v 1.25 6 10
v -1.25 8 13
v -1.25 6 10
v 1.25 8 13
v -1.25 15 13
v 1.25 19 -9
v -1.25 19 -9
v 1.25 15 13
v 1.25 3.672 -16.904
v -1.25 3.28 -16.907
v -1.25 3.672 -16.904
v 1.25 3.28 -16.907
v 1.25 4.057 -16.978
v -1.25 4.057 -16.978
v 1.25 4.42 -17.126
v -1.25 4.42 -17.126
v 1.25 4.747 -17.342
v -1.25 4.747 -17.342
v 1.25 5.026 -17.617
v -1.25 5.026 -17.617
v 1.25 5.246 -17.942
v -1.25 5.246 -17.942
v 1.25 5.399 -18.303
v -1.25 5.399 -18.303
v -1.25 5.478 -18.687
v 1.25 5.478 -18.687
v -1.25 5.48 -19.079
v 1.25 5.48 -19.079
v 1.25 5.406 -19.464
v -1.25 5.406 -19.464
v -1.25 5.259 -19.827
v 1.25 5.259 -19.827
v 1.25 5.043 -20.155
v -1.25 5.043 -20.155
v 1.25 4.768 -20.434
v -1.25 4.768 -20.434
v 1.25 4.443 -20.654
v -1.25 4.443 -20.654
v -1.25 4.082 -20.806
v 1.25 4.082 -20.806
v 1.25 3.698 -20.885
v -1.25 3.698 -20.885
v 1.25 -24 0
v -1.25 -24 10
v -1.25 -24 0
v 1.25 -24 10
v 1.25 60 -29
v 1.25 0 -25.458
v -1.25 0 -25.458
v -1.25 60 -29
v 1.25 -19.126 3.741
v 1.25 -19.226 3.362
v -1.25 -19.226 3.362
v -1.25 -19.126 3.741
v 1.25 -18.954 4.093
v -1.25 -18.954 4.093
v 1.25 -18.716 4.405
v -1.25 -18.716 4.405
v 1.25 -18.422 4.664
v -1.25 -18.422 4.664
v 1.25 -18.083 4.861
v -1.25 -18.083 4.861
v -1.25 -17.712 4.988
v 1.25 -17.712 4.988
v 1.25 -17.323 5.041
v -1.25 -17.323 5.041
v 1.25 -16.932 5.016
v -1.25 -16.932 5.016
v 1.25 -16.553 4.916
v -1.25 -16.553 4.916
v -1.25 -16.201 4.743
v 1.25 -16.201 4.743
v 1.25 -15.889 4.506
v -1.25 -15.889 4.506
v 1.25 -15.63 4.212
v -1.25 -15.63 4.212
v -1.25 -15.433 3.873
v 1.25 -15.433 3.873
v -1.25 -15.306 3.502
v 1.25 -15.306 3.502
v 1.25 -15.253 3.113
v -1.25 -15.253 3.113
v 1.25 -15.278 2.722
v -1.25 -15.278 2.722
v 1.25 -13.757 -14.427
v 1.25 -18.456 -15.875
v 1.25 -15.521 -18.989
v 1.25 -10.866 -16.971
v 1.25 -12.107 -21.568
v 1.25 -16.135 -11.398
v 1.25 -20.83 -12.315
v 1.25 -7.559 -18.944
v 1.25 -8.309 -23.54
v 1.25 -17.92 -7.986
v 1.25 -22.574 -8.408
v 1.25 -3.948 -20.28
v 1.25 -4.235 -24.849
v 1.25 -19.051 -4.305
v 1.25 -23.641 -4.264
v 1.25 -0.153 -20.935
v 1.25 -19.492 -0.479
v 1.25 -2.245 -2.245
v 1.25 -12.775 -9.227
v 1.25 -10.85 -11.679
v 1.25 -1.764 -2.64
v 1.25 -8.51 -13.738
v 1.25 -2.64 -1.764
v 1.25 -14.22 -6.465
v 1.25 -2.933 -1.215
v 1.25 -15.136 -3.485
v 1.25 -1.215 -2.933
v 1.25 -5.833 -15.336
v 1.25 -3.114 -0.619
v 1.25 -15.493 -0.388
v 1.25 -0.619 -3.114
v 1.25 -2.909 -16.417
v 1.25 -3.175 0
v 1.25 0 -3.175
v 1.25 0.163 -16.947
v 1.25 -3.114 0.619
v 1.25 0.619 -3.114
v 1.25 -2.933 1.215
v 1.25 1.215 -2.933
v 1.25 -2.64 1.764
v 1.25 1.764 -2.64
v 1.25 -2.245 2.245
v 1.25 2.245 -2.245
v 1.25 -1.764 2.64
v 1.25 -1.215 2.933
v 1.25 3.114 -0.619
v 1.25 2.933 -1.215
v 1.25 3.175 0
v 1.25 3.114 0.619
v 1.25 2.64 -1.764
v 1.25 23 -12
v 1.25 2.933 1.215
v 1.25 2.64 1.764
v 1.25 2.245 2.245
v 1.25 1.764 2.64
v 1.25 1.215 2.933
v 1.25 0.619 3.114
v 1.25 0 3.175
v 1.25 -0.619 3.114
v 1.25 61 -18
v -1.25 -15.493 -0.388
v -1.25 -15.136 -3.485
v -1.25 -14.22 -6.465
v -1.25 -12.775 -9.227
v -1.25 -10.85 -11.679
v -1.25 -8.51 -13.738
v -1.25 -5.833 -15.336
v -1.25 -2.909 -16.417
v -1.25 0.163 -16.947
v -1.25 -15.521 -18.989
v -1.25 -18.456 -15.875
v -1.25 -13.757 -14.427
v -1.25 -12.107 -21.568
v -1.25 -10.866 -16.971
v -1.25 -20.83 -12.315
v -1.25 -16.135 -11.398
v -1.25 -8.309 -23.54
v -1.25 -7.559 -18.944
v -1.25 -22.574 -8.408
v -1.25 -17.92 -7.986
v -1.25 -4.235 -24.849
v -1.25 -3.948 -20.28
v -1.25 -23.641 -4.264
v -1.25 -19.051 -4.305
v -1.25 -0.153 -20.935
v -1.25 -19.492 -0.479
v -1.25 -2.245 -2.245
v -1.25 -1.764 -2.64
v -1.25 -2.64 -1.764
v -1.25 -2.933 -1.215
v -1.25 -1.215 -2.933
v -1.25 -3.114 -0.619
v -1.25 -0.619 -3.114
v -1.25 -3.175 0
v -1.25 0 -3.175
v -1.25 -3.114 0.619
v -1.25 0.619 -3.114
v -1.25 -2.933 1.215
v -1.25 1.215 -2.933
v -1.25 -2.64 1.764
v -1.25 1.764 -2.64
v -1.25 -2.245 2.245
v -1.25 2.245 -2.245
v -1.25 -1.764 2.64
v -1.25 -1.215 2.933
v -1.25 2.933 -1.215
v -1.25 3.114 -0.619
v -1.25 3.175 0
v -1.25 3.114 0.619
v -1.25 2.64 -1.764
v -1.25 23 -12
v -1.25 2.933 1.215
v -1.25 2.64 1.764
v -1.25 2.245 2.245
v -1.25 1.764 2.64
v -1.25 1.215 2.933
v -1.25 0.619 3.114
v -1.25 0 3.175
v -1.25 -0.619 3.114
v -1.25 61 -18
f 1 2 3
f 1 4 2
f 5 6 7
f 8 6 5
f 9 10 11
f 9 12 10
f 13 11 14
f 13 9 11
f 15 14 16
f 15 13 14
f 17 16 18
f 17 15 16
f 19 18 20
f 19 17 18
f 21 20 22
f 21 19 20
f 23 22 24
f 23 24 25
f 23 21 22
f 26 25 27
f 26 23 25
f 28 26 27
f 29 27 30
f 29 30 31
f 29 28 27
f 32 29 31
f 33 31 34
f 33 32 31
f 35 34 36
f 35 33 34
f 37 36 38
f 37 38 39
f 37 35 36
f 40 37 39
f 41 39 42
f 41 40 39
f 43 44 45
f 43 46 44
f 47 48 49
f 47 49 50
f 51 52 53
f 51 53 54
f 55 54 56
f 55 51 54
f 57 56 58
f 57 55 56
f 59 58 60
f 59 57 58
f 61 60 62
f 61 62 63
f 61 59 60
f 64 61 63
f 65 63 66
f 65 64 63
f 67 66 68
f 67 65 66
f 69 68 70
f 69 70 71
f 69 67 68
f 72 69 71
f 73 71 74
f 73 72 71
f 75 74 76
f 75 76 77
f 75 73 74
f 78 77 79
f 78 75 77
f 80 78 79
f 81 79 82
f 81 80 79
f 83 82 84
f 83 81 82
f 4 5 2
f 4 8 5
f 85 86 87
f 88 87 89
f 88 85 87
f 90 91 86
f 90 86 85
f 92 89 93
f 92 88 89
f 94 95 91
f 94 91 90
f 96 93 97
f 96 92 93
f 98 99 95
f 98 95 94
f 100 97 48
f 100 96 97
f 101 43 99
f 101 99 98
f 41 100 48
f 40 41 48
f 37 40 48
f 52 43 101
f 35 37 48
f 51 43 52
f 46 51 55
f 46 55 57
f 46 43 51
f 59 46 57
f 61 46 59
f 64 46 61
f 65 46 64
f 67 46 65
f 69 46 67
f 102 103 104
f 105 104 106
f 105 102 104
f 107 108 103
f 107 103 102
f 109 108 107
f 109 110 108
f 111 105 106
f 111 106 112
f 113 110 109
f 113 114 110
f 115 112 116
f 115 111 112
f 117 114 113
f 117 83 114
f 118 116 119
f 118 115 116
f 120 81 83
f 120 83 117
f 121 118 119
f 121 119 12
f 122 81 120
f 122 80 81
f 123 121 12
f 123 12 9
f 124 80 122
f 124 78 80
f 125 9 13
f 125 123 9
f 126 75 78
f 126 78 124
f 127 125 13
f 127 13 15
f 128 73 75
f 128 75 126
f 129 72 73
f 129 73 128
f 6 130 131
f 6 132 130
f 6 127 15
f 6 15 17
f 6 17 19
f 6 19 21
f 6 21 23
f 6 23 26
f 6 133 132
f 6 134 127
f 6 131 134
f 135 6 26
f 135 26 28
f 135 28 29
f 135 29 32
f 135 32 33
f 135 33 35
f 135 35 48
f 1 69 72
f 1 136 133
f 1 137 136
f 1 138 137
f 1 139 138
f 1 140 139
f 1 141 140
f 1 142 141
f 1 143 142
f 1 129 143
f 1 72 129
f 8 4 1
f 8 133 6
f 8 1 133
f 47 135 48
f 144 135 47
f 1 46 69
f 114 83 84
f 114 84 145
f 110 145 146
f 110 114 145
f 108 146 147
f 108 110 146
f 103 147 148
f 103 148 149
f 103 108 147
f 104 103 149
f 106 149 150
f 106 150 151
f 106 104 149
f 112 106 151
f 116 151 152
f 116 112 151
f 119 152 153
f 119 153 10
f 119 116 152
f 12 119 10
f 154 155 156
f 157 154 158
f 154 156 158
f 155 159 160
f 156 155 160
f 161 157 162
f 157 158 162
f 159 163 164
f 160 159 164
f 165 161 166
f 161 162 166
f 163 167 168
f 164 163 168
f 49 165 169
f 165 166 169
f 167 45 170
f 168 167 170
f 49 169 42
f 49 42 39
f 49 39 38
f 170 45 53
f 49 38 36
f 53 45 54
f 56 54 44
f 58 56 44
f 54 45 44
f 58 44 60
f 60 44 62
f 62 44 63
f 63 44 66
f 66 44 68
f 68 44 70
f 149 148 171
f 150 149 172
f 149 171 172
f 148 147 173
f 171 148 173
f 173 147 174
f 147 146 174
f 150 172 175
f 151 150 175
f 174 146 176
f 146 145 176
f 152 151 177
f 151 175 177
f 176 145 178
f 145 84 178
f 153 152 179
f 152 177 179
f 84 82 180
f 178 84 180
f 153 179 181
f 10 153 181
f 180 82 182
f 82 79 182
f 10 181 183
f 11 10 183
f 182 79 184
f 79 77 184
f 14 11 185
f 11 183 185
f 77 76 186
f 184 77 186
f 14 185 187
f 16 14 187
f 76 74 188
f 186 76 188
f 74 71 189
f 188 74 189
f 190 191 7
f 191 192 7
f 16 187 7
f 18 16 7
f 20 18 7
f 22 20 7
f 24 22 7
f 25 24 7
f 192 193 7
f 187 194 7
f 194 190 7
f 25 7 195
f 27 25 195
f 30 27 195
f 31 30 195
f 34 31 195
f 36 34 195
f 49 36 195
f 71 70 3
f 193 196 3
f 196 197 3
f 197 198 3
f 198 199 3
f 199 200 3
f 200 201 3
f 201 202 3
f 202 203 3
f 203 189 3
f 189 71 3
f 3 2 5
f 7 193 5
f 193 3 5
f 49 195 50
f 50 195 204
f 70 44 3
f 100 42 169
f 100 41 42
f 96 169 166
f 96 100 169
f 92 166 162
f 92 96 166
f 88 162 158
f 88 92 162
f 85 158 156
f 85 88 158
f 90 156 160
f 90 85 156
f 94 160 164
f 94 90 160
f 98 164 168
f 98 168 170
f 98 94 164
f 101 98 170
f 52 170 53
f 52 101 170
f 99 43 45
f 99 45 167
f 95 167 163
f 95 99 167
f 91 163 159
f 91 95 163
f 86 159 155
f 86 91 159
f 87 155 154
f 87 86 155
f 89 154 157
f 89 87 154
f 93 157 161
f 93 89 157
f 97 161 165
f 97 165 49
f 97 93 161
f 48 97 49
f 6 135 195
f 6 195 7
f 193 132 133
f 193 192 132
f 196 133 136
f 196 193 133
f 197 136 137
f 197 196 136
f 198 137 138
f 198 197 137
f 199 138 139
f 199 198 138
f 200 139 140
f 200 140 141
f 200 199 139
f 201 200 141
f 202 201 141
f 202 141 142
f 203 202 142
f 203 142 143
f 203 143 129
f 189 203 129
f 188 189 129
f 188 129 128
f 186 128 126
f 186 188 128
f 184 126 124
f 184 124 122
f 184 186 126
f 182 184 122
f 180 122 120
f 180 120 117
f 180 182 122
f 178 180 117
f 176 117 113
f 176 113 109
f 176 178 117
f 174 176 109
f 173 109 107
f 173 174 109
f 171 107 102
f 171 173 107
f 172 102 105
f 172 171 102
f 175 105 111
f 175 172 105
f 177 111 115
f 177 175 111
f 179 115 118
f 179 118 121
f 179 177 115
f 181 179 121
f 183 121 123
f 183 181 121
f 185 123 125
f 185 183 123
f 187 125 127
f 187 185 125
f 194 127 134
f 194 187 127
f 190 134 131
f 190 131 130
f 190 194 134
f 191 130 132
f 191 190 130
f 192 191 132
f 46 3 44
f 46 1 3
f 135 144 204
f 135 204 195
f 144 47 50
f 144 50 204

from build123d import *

# Parameters (mm, degrees)
F0_R     = 3.175
F1_DEPTH = 1.25


with BuildPart() as f1:
    # F0 (on Right) → F1 (new body, symmetric)
    with BuildSketch(Plane.YZ):
        with BuildLine():
            Line((-24, 10), (-24, 0))
            ThreePointArc((-24, 0), (-17.054114, -17.493789), (0, -25.458409))
            Line((0, -25.458409), (60, -29))
            Line((60, -29), (61, -18))
            Line((61, -18), (23, -12))
            Line((23, -12), (19, -9))
            Line((19, -9), (15, 13))
            Line((15, 13), (8, 13))
            Line((8, 13), (6, 10))
            Line((6, 10), (-24, 10))
        make_face()
        with BuildLine():
            ThreePointArc((-19.226374, 3.362237), (-16.931961, 5.016223), (-15.277975, 2.721811))
            ThreePointArc((-15.277975, 2.721811), (-10.850381, -11.679078), (3.279705, -16.906872))
            ThreePointArc((3.279705, -16.906872), (5.477806, -18.686859), (3.697819, -20.88496))
            ThreePointArc((3.697819, -20.88496), (-13.756994, -14.427096), (-19.226374, 3.362237))
        make_face(mode=Mode.SUBTRACT)
        Circle(F0_R, mode=Mode.SUBTRACT)
    extrude(amount=F1_DEPTH, both=True)


solid = f1.part
